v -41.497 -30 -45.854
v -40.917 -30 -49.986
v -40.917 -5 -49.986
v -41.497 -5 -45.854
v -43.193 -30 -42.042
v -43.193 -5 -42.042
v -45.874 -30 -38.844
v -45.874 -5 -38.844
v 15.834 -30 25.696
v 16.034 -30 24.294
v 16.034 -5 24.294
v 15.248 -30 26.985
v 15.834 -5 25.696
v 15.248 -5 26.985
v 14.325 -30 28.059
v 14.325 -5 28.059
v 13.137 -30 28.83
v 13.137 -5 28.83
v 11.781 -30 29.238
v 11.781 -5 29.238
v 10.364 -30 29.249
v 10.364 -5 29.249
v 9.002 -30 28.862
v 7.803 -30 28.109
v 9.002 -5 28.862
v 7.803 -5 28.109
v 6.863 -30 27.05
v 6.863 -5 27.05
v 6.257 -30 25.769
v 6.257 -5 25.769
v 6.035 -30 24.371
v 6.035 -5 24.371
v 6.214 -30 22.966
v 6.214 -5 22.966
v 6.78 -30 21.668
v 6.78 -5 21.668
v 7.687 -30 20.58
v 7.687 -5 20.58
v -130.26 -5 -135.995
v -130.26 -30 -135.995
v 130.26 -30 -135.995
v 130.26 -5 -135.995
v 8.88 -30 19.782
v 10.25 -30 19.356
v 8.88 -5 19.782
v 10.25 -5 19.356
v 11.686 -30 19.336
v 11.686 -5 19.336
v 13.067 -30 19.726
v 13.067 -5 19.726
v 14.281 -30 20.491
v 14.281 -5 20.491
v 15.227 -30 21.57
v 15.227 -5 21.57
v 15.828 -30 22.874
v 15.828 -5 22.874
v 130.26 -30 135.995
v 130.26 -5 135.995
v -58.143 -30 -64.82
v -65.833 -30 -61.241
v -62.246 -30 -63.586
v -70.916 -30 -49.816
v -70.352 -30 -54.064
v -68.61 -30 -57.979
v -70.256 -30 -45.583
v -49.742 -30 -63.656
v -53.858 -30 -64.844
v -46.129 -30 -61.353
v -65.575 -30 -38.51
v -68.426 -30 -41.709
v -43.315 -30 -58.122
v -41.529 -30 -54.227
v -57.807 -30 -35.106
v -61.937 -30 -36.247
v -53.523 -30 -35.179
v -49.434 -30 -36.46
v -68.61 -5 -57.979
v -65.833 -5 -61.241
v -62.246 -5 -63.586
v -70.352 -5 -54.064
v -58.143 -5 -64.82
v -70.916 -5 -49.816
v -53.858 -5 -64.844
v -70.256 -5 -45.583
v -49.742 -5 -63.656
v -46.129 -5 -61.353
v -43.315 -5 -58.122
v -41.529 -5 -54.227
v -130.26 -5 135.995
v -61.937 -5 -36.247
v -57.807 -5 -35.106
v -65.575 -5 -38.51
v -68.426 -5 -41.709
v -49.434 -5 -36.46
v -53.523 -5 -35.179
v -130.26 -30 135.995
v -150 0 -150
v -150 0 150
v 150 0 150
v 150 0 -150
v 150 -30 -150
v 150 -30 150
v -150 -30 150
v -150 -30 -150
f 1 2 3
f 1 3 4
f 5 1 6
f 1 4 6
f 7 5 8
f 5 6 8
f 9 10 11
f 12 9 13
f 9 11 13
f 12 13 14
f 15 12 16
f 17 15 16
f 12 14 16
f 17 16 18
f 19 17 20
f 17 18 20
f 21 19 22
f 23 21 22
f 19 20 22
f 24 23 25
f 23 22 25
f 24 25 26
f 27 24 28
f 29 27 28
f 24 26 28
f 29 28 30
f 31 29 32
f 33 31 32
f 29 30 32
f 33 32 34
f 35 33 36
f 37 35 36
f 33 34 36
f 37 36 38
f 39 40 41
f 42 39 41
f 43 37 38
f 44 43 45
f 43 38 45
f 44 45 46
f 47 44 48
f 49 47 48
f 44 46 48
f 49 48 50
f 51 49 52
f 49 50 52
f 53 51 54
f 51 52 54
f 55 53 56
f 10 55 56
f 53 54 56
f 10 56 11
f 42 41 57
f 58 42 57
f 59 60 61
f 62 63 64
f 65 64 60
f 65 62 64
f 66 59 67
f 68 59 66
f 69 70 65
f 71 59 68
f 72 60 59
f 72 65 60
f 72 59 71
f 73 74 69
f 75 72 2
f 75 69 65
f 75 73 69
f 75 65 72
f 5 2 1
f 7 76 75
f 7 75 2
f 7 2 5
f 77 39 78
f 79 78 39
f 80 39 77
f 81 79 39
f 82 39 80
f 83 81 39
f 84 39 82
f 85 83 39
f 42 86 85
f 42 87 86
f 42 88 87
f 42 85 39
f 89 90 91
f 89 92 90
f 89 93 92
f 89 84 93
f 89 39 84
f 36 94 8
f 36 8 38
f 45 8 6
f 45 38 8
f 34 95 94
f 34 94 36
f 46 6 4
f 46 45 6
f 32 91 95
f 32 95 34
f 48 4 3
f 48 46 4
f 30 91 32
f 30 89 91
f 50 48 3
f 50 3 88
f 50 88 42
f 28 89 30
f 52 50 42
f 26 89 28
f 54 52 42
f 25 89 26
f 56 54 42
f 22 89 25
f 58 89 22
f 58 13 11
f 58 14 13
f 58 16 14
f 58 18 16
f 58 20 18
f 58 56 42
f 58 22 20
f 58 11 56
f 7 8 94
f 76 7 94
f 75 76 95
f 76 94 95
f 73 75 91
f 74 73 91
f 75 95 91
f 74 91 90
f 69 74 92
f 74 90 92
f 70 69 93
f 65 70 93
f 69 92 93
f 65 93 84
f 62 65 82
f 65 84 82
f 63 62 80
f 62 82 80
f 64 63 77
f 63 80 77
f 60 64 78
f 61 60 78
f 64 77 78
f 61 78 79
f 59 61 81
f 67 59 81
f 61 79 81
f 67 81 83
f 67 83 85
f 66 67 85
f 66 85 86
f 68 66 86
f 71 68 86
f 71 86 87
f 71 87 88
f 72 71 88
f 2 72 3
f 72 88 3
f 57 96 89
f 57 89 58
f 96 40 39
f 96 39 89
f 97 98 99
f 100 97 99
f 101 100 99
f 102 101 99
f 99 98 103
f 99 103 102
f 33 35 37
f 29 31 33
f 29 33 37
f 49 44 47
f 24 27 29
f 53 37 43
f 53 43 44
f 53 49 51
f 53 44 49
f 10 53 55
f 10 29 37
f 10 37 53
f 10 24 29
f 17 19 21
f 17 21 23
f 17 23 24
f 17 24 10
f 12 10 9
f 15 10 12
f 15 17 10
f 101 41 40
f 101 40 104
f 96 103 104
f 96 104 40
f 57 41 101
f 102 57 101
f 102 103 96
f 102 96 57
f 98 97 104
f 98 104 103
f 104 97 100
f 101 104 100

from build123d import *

# Parameters (mm, degrees)
F0_W     = 300
F0_H     = 300
F1_DEPTH = 30
F2_W     = 260.52019
F2_H     = 271.989614
F3_DEPTH = 25
F5_DEPTH = 25


with BuildPart() as f1:
    # F0 (on Front) → F1 (new body)
    with BuildSketch(Plane.XZ):
        Rectangle(F0_W, F0_H)
    extrude(amount=F1_DEPTH)

    # F2 (on face) → F3 (cut)
    with BuildSketch(Plane.XZ.offset(30)):
        Rectangle(F2_W, F2_H)
    extrude(amount=-F3_DEPTH, mode=Mode.SUBTRACT)

    # F4 (on face) → F5 (join)
    with BuildSketch(Plane.XZ.offset(5)):
        with BuildLine():
            ThreePointArc((-45.873974, -38.844235), (-69.621389, -56.0838), (-40.916645, -49.986262))
            ThreePointArc((-40.916645, -49.986262), (-42.2119, -43.888724), (-45.873974, -38.844235))
        make_face()
        with BuildLine():
            ThreePointArc((16.034492, 24.293919), (9.001979, 28.862168), (7.686935, 20.57991))
            ThreePointArc((7.686935, 20.57991), (13.067005, 19.725671), (16.034492, 24.293919))
        make_face()
    extrude(amount=F5_DEPTH)


solid = f1.part
